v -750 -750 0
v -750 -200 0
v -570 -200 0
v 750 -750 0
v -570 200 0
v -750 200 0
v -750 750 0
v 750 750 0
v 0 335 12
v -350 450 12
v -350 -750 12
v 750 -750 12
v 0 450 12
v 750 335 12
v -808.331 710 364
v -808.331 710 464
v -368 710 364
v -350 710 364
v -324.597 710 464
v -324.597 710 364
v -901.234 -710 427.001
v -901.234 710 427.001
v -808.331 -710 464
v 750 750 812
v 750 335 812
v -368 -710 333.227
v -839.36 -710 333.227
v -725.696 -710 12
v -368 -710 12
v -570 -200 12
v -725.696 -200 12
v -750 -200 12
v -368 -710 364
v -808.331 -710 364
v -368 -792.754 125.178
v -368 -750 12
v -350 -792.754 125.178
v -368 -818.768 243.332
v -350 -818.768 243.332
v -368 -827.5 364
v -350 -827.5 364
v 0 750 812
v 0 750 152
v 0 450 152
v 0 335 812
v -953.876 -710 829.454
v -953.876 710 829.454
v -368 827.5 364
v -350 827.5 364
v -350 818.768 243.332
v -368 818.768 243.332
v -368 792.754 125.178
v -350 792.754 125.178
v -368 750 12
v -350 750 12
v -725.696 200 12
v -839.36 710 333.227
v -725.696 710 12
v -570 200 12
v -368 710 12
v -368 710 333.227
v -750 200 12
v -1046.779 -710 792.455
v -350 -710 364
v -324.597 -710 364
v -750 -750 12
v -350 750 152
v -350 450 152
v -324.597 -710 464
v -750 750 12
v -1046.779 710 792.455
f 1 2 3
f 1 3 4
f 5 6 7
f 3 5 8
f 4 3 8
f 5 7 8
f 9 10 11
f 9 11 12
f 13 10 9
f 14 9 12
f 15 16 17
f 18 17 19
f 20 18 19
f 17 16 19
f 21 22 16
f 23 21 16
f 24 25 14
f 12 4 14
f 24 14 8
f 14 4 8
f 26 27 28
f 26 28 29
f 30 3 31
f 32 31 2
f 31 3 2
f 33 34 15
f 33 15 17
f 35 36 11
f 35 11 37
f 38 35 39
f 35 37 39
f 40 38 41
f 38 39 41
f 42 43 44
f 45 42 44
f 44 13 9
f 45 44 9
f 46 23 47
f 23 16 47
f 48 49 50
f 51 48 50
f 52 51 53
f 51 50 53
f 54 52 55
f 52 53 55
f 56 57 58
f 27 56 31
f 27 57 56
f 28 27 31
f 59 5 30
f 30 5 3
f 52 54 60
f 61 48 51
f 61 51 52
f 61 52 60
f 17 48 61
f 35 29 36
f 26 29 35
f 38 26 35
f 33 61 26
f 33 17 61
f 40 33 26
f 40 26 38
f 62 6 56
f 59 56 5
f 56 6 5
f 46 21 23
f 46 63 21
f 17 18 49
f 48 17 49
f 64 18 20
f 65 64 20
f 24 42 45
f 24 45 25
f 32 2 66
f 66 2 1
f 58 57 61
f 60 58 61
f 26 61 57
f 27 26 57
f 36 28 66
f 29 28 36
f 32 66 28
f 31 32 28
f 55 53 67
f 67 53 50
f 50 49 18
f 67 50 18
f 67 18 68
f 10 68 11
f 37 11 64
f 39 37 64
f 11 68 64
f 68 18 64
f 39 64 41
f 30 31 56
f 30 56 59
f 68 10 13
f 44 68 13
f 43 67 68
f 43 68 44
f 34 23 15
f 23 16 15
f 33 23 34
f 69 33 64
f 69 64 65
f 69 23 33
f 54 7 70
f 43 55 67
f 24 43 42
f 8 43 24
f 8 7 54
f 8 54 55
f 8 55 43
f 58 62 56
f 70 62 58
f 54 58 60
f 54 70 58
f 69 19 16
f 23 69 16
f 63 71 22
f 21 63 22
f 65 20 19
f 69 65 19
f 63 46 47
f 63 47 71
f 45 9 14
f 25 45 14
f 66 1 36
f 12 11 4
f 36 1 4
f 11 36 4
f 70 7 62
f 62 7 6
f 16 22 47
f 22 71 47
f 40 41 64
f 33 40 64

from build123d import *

# Parameters (mm, degrees)
F1_DEPTH  = 12
F6_DEPTH  = 18
F7_DEPTH  = 800
F3_W      = 350
F3_H      = 300
F8_DEPTH  = 140
F10_DEPTH = 710


with BuildPart() as f1:
    # F0 (on Top) → F1 (new body)
    with BuildSketch(Plane.XY):
        Polygon((750, -750), (750, 750), (-750, 750), (-750, 200), (-570, 200), (-570, -200), (-750, -200), (-750, -750), align=None)
    extrude(amount=F1_DEPTH)

    # F5 (on face) → F6 (join)
    with BuildSketch(Plane(origin=(-350, 0, 0), x_dir=(0, -1, 0), z_dir=(-1, 0, 0))):
        with BuildLine():
            ThreePointArc((750, 12), (807.895723, 183.784677), (827.5, 364))
            Line((827.5, 364), (-827.5, 364))
            ThreePointArc((-827.5, 364), (-807.895723, 183.784677), (-750, 12))
            Line((-750, 12), (750, 12))
        make_face()
    extrude(amount=F6_DEPTH)

    # F3 (on face) → F7 (join)
    with BuildSketch(Plane.XY.offset(12)):
        Polygon((750, 335), (750, 750), (0, 750), (0, 450), (0, 335), align=None)
    extrude(amount=F7_DEPTH)

    # F3 (on face) → F8 (join)
    with BuildSketch(Plane.XY.offset(12)):
        with Locations((-175, 600)):
            Rectangle(F3_W, F3_H)
    extrude(amount=F8_DEPTH)

    # F9 (on Front) → F10 (join, symmetric)
    with BuildSketch(Plane.XZ):
        Polygon((-901.234423, 427.000572), (-808.331019, 464), (-953.875601, 829.453945), (-1046.779004, 792.454517), align=None)
        Polygon((-368, 364), (-324.597418, 364), (-324.597418, 464), (-808.331019, 464), (-808.331019, 364), align=None)
        Polygon((-368, 12), (-368, 333.22683), (-839.359641, 333.22683), (-725.695813, 12), align=None)
    extrude(amount=F10_DEPTH, both=True)


solid = f1.part
